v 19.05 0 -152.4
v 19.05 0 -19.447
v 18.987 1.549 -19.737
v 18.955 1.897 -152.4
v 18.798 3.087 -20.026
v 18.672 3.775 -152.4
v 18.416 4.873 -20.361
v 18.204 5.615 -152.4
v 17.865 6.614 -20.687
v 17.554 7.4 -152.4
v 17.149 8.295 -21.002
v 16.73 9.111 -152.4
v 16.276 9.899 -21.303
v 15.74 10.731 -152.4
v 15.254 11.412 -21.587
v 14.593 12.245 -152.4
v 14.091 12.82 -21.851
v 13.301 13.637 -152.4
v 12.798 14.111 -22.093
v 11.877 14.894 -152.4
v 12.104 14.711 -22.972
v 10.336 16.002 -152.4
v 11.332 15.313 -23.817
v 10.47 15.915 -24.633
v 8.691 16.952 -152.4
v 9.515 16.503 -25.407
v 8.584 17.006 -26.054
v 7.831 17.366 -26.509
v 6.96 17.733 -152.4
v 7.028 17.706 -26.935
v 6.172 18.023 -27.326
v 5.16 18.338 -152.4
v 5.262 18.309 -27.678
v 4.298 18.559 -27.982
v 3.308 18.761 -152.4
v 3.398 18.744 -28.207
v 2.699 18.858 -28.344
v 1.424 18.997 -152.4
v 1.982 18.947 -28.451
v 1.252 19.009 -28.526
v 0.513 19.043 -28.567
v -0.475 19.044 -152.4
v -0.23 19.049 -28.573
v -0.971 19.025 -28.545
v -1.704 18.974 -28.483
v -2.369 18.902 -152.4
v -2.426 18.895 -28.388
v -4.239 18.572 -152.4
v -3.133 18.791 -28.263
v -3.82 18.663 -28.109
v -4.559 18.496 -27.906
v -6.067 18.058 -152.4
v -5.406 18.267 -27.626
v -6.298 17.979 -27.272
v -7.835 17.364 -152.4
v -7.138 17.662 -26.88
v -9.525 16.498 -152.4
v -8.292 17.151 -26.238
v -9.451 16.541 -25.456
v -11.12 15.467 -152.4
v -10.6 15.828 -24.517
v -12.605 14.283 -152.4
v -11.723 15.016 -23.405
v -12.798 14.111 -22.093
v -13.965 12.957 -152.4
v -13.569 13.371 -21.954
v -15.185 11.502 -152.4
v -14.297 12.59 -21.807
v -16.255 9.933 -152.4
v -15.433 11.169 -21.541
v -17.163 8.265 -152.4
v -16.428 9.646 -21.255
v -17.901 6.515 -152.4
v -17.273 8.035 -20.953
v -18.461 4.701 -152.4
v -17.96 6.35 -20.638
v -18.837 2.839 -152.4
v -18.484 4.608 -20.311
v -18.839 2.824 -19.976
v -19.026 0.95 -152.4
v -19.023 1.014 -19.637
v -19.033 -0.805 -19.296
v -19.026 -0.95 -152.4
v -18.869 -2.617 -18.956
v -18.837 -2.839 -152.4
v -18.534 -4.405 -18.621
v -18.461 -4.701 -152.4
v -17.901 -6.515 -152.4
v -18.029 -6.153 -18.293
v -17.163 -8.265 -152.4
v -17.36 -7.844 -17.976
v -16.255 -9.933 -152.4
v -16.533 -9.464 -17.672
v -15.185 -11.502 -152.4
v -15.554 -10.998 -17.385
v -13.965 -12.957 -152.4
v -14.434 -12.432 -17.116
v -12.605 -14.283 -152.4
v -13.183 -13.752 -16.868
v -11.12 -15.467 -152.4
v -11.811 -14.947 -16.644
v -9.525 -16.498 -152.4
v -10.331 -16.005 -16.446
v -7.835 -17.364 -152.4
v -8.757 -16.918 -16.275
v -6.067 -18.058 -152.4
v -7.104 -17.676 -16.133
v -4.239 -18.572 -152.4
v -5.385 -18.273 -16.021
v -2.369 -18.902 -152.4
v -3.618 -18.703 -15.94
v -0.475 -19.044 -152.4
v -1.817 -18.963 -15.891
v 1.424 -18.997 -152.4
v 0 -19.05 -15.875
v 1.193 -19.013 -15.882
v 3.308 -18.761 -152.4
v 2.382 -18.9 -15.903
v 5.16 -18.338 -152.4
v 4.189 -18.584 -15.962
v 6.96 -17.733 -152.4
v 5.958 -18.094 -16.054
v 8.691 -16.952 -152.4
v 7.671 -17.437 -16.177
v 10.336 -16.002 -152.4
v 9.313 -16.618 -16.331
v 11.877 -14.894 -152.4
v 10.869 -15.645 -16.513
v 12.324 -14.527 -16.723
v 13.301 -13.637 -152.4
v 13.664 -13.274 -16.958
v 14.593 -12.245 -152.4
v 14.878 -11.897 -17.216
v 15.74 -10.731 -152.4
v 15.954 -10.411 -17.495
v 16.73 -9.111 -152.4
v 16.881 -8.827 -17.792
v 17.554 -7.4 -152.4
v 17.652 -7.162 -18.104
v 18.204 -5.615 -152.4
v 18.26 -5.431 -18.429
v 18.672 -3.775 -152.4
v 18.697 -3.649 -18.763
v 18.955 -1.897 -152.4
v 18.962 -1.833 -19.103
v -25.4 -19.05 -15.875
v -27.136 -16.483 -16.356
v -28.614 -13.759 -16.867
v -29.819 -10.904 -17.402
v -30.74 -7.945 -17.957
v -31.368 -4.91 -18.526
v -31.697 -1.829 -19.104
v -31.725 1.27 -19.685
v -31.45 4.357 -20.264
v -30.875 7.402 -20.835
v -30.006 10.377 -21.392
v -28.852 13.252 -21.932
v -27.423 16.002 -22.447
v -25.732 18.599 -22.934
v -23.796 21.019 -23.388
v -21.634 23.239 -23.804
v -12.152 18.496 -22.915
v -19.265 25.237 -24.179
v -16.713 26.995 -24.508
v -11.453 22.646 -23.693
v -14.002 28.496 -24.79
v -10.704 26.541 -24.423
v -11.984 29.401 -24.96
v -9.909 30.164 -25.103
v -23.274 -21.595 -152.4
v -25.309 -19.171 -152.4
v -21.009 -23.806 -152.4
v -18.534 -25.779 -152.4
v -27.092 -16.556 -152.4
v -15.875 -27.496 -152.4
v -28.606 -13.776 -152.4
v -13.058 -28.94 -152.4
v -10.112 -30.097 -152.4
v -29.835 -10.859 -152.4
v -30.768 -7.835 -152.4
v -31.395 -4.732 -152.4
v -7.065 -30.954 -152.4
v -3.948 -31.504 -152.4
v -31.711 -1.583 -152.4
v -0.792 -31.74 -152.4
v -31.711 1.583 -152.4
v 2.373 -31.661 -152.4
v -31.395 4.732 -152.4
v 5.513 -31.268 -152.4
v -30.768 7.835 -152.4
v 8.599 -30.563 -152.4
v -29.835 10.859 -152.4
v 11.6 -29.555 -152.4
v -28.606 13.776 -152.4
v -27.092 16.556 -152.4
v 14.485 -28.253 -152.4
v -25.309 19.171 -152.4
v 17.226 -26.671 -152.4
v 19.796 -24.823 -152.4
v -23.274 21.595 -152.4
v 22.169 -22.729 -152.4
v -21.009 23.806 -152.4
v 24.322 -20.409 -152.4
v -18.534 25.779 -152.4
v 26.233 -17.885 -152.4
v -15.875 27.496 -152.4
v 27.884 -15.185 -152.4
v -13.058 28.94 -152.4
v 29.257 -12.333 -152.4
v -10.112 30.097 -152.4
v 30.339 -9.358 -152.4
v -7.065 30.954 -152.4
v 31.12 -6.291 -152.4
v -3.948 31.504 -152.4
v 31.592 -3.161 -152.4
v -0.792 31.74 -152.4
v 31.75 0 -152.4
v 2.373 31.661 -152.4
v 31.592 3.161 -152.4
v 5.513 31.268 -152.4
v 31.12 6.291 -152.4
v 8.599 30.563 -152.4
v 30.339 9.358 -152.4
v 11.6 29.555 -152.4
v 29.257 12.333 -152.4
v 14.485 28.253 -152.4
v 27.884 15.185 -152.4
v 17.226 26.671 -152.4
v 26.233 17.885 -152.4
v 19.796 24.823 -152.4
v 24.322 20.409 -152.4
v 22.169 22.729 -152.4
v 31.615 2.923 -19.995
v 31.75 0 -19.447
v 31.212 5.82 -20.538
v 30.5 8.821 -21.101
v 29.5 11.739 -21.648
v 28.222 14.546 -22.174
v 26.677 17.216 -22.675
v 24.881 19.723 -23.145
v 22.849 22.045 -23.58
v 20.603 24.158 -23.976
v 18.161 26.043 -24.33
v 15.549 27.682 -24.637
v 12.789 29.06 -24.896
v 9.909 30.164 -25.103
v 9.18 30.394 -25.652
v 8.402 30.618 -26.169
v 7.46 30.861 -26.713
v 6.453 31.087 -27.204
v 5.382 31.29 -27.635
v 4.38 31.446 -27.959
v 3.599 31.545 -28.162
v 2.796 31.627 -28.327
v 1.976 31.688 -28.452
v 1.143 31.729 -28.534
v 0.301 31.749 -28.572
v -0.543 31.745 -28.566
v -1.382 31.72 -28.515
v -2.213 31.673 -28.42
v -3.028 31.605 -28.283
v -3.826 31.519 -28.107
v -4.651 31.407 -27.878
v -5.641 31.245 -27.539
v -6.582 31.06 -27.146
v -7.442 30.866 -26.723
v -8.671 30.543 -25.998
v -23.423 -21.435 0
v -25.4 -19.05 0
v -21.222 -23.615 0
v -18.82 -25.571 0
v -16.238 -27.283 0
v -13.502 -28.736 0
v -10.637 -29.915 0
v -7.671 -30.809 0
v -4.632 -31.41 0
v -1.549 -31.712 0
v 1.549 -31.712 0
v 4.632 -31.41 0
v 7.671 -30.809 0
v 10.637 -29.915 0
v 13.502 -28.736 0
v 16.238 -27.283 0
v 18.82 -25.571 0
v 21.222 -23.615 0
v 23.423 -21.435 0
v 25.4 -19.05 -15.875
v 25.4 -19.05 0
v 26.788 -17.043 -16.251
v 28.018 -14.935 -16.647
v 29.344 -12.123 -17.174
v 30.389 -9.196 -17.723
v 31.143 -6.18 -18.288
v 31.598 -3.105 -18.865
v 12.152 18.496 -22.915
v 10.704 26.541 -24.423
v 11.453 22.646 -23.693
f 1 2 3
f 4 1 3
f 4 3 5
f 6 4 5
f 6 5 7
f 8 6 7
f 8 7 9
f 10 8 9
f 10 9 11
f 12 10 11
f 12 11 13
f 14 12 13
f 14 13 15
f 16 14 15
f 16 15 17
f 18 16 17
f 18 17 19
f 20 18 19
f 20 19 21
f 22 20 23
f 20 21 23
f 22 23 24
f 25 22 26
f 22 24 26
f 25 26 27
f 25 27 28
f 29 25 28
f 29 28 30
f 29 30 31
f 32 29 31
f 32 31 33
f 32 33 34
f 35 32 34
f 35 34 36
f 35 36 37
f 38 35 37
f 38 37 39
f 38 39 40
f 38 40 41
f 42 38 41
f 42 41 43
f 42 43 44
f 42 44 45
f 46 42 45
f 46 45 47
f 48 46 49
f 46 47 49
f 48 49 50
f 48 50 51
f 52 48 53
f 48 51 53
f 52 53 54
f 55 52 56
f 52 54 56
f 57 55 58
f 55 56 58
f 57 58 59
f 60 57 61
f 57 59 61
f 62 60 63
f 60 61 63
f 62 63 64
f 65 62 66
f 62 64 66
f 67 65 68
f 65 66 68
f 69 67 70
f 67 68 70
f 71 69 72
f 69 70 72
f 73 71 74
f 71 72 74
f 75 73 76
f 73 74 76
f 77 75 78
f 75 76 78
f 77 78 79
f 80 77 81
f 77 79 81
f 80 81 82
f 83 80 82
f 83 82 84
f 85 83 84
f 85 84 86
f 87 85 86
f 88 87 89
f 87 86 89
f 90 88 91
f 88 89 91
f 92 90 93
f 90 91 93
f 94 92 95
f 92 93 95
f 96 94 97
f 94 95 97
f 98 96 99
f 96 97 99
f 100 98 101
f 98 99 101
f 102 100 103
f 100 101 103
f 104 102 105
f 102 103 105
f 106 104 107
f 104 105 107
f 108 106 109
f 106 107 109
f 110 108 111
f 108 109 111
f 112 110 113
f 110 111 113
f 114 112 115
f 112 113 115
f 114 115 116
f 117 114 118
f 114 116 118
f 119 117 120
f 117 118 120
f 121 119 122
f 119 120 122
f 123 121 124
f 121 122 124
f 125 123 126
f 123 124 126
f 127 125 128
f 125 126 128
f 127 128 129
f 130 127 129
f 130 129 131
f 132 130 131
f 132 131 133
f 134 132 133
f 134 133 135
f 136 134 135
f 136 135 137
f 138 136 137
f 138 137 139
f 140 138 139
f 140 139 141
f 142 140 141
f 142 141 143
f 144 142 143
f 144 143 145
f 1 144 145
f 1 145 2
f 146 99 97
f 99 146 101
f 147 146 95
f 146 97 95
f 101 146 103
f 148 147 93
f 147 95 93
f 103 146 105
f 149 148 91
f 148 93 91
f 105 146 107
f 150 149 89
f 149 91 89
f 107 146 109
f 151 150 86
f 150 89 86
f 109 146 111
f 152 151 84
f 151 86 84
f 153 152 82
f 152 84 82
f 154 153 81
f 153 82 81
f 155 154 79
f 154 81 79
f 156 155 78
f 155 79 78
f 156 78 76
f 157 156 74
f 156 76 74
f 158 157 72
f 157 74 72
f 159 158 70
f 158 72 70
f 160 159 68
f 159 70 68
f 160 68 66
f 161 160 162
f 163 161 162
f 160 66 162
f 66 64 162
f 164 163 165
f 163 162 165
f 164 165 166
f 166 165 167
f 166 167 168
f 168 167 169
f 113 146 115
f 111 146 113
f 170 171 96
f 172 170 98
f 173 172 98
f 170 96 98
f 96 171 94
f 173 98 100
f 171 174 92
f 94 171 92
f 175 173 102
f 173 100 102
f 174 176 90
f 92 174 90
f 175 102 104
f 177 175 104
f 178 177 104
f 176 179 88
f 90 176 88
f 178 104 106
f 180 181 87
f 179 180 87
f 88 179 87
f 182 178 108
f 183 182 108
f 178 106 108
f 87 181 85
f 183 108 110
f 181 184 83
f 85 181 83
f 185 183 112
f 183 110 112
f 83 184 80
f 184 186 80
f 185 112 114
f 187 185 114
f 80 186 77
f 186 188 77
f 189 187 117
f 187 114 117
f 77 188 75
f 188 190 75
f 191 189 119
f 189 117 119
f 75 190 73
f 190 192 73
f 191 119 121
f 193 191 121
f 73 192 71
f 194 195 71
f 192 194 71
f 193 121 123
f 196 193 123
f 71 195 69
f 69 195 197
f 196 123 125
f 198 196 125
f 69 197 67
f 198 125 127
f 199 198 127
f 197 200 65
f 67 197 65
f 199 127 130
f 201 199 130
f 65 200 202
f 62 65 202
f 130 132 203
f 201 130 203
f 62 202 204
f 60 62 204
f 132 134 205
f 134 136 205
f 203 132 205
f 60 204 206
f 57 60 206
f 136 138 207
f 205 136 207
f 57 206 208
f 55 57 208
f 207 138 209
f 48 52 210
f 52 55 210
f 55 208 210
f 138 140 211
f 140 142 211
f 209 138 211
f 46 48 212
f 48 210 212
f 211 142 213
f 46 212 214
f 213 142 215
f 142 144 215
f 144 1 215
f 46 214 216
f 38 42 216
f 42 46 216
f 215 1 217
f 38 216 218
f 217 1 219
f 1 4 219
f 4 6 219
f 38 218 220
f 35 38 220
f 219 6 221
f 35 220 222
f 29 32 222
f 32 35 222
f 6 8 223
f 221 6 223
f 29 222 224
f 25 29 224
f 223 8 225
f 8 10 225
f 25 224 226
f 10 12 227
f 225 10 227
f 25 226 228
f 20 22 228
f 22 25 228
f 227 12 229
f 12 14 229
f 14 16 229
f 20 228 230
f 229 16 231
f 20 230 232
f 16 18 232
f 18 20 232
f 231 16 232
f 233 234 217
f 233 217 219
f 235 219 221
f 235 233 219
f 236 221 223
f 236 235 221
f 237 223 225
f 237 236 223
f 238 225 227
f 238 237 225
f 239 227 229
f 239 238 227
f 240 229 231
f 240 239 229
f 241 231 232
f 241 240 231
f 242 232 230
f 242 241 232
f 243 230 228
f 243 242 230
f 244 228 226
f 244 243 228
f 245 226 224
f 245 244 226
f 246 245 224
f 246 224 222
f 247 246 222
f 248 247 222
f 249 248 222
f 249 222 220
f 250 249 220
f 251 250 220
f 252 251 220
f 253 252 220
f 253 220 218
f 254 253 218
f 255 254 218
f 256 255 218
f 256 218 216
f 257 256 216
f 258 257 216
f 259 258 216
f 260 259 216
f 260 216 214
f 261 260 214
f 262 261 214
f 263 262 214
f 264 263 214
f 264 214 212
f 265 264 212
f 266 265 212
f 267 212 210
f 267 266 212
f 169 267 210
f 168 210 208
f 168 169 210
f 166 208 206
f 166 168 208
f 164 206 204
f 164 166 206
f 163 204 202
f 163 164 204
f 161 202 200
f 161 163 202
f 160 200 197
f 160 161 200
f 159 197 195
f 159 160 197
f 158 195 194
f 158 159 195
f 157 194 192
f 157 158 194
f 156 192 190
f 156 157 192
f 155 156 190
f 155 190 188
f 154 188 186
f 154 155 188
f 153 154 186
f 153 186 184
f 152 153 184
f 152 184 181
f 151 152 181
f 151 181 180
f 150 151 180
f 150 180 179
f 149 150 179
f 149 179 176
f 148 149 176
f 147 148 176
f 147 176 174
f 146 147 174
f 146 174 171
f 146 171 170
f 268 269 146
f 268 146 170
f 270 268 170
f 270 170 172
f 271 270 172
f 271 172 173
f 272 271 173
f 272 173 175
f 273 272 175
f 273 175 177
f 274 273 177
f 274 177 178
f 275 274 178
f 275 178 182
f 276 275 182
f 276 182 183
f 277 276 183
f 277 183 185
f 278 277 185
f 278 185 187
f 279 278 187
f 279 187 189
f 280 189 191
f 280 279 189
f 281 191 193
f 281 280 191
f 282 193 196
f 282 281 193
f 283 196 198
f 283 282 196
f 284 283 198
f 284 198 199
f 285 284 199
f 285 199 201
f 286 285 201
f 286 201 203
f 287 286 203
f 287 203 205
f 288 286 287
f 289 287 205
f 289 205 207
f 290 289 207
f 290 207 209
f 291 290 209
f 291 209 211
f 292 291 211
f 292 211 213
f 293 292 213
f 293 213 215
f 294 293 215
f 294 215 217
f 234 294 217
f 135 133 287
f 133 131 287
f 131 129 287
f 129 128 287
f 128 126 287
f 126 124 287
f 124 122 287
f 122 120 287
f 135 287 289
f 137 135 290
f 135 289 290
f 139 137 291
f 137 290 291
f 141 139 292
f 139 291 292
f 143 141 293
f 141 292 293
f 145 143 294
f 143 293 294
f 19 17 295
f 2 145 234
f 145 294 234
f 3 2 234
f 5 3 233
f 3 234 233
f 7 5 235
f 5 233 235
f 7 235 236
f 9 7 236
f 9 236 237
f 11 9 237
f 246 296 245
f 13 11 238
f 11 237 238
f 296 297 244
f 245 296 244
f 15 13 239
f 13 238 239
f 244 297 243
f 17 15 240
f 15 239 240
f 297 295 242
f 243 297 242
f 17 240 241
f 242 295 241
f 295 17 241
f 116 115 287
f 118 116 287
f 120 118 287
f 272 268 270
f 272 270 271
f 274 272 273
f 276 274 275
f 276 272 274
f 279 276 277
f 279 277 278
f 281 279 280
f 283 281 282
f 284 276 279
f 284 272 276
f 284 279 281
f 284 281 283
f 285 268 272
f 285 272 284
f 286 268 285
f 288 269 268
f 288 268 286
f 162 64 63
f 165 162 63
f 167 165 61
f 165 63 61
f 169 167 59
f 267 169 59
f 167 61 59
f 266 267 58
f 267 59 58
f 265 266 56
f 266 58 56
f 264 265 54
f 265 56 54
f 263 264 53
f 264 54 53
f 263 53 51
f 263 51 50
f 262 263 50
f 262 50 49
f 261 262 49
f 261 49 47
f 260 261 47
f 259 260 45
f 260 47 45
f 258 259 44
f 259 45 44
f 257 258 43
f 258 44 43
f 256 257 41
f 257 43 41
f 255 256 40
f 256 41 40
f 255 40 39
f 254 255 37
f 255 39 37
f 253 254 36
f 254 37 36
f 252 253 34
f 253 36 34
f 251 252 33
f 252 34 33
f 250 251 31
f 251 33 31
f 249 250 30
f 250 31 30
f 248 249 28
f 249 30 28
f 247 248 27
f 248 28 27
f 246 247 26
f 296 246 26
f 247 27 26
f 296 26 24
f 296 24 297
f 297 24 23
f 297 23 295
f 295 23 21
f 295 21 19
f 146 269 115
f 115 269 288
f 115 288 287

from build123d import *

# Parameters (mm, degrees)
F0_R     = 31.75
F0_R_2   = 19.05
F1_DEPTH = 152.4
F3_DEPTH = 50.8
F4_R     = 15.875
F5_DEPTH = 50.8


with BuildPart() as f1:
    # F0 (on Top) → F1 (new body)
    with BuildSketch(Plane.XY):
        Circle(F0_R)
        Circle(F0_R_2, mode=Mode.SUBTRACT)
    extrude(amount=-F1_DEPTH)

    # F2 (on Right) → F3 (cut, symmetric)
    with BuildSketch(Plane.YZ):
        Polygon((31.75, 0), (-19.05, 0), (-19.05, -15.875), (31.75, -25.4), align=None)
    extrude(amount=F3_DEPTH, both=True, mode=Mode.SUBTRACT)

    # F4 (on Front) → F5 (cut)
    with BuildSketch(Plane.XZ):
        with Locations((0, -12.7)):
            Circle(F4_R)
    extrude(amount=-F5_DEPTH, mode=Mode.SUBTRACT)


solid = f1.part
